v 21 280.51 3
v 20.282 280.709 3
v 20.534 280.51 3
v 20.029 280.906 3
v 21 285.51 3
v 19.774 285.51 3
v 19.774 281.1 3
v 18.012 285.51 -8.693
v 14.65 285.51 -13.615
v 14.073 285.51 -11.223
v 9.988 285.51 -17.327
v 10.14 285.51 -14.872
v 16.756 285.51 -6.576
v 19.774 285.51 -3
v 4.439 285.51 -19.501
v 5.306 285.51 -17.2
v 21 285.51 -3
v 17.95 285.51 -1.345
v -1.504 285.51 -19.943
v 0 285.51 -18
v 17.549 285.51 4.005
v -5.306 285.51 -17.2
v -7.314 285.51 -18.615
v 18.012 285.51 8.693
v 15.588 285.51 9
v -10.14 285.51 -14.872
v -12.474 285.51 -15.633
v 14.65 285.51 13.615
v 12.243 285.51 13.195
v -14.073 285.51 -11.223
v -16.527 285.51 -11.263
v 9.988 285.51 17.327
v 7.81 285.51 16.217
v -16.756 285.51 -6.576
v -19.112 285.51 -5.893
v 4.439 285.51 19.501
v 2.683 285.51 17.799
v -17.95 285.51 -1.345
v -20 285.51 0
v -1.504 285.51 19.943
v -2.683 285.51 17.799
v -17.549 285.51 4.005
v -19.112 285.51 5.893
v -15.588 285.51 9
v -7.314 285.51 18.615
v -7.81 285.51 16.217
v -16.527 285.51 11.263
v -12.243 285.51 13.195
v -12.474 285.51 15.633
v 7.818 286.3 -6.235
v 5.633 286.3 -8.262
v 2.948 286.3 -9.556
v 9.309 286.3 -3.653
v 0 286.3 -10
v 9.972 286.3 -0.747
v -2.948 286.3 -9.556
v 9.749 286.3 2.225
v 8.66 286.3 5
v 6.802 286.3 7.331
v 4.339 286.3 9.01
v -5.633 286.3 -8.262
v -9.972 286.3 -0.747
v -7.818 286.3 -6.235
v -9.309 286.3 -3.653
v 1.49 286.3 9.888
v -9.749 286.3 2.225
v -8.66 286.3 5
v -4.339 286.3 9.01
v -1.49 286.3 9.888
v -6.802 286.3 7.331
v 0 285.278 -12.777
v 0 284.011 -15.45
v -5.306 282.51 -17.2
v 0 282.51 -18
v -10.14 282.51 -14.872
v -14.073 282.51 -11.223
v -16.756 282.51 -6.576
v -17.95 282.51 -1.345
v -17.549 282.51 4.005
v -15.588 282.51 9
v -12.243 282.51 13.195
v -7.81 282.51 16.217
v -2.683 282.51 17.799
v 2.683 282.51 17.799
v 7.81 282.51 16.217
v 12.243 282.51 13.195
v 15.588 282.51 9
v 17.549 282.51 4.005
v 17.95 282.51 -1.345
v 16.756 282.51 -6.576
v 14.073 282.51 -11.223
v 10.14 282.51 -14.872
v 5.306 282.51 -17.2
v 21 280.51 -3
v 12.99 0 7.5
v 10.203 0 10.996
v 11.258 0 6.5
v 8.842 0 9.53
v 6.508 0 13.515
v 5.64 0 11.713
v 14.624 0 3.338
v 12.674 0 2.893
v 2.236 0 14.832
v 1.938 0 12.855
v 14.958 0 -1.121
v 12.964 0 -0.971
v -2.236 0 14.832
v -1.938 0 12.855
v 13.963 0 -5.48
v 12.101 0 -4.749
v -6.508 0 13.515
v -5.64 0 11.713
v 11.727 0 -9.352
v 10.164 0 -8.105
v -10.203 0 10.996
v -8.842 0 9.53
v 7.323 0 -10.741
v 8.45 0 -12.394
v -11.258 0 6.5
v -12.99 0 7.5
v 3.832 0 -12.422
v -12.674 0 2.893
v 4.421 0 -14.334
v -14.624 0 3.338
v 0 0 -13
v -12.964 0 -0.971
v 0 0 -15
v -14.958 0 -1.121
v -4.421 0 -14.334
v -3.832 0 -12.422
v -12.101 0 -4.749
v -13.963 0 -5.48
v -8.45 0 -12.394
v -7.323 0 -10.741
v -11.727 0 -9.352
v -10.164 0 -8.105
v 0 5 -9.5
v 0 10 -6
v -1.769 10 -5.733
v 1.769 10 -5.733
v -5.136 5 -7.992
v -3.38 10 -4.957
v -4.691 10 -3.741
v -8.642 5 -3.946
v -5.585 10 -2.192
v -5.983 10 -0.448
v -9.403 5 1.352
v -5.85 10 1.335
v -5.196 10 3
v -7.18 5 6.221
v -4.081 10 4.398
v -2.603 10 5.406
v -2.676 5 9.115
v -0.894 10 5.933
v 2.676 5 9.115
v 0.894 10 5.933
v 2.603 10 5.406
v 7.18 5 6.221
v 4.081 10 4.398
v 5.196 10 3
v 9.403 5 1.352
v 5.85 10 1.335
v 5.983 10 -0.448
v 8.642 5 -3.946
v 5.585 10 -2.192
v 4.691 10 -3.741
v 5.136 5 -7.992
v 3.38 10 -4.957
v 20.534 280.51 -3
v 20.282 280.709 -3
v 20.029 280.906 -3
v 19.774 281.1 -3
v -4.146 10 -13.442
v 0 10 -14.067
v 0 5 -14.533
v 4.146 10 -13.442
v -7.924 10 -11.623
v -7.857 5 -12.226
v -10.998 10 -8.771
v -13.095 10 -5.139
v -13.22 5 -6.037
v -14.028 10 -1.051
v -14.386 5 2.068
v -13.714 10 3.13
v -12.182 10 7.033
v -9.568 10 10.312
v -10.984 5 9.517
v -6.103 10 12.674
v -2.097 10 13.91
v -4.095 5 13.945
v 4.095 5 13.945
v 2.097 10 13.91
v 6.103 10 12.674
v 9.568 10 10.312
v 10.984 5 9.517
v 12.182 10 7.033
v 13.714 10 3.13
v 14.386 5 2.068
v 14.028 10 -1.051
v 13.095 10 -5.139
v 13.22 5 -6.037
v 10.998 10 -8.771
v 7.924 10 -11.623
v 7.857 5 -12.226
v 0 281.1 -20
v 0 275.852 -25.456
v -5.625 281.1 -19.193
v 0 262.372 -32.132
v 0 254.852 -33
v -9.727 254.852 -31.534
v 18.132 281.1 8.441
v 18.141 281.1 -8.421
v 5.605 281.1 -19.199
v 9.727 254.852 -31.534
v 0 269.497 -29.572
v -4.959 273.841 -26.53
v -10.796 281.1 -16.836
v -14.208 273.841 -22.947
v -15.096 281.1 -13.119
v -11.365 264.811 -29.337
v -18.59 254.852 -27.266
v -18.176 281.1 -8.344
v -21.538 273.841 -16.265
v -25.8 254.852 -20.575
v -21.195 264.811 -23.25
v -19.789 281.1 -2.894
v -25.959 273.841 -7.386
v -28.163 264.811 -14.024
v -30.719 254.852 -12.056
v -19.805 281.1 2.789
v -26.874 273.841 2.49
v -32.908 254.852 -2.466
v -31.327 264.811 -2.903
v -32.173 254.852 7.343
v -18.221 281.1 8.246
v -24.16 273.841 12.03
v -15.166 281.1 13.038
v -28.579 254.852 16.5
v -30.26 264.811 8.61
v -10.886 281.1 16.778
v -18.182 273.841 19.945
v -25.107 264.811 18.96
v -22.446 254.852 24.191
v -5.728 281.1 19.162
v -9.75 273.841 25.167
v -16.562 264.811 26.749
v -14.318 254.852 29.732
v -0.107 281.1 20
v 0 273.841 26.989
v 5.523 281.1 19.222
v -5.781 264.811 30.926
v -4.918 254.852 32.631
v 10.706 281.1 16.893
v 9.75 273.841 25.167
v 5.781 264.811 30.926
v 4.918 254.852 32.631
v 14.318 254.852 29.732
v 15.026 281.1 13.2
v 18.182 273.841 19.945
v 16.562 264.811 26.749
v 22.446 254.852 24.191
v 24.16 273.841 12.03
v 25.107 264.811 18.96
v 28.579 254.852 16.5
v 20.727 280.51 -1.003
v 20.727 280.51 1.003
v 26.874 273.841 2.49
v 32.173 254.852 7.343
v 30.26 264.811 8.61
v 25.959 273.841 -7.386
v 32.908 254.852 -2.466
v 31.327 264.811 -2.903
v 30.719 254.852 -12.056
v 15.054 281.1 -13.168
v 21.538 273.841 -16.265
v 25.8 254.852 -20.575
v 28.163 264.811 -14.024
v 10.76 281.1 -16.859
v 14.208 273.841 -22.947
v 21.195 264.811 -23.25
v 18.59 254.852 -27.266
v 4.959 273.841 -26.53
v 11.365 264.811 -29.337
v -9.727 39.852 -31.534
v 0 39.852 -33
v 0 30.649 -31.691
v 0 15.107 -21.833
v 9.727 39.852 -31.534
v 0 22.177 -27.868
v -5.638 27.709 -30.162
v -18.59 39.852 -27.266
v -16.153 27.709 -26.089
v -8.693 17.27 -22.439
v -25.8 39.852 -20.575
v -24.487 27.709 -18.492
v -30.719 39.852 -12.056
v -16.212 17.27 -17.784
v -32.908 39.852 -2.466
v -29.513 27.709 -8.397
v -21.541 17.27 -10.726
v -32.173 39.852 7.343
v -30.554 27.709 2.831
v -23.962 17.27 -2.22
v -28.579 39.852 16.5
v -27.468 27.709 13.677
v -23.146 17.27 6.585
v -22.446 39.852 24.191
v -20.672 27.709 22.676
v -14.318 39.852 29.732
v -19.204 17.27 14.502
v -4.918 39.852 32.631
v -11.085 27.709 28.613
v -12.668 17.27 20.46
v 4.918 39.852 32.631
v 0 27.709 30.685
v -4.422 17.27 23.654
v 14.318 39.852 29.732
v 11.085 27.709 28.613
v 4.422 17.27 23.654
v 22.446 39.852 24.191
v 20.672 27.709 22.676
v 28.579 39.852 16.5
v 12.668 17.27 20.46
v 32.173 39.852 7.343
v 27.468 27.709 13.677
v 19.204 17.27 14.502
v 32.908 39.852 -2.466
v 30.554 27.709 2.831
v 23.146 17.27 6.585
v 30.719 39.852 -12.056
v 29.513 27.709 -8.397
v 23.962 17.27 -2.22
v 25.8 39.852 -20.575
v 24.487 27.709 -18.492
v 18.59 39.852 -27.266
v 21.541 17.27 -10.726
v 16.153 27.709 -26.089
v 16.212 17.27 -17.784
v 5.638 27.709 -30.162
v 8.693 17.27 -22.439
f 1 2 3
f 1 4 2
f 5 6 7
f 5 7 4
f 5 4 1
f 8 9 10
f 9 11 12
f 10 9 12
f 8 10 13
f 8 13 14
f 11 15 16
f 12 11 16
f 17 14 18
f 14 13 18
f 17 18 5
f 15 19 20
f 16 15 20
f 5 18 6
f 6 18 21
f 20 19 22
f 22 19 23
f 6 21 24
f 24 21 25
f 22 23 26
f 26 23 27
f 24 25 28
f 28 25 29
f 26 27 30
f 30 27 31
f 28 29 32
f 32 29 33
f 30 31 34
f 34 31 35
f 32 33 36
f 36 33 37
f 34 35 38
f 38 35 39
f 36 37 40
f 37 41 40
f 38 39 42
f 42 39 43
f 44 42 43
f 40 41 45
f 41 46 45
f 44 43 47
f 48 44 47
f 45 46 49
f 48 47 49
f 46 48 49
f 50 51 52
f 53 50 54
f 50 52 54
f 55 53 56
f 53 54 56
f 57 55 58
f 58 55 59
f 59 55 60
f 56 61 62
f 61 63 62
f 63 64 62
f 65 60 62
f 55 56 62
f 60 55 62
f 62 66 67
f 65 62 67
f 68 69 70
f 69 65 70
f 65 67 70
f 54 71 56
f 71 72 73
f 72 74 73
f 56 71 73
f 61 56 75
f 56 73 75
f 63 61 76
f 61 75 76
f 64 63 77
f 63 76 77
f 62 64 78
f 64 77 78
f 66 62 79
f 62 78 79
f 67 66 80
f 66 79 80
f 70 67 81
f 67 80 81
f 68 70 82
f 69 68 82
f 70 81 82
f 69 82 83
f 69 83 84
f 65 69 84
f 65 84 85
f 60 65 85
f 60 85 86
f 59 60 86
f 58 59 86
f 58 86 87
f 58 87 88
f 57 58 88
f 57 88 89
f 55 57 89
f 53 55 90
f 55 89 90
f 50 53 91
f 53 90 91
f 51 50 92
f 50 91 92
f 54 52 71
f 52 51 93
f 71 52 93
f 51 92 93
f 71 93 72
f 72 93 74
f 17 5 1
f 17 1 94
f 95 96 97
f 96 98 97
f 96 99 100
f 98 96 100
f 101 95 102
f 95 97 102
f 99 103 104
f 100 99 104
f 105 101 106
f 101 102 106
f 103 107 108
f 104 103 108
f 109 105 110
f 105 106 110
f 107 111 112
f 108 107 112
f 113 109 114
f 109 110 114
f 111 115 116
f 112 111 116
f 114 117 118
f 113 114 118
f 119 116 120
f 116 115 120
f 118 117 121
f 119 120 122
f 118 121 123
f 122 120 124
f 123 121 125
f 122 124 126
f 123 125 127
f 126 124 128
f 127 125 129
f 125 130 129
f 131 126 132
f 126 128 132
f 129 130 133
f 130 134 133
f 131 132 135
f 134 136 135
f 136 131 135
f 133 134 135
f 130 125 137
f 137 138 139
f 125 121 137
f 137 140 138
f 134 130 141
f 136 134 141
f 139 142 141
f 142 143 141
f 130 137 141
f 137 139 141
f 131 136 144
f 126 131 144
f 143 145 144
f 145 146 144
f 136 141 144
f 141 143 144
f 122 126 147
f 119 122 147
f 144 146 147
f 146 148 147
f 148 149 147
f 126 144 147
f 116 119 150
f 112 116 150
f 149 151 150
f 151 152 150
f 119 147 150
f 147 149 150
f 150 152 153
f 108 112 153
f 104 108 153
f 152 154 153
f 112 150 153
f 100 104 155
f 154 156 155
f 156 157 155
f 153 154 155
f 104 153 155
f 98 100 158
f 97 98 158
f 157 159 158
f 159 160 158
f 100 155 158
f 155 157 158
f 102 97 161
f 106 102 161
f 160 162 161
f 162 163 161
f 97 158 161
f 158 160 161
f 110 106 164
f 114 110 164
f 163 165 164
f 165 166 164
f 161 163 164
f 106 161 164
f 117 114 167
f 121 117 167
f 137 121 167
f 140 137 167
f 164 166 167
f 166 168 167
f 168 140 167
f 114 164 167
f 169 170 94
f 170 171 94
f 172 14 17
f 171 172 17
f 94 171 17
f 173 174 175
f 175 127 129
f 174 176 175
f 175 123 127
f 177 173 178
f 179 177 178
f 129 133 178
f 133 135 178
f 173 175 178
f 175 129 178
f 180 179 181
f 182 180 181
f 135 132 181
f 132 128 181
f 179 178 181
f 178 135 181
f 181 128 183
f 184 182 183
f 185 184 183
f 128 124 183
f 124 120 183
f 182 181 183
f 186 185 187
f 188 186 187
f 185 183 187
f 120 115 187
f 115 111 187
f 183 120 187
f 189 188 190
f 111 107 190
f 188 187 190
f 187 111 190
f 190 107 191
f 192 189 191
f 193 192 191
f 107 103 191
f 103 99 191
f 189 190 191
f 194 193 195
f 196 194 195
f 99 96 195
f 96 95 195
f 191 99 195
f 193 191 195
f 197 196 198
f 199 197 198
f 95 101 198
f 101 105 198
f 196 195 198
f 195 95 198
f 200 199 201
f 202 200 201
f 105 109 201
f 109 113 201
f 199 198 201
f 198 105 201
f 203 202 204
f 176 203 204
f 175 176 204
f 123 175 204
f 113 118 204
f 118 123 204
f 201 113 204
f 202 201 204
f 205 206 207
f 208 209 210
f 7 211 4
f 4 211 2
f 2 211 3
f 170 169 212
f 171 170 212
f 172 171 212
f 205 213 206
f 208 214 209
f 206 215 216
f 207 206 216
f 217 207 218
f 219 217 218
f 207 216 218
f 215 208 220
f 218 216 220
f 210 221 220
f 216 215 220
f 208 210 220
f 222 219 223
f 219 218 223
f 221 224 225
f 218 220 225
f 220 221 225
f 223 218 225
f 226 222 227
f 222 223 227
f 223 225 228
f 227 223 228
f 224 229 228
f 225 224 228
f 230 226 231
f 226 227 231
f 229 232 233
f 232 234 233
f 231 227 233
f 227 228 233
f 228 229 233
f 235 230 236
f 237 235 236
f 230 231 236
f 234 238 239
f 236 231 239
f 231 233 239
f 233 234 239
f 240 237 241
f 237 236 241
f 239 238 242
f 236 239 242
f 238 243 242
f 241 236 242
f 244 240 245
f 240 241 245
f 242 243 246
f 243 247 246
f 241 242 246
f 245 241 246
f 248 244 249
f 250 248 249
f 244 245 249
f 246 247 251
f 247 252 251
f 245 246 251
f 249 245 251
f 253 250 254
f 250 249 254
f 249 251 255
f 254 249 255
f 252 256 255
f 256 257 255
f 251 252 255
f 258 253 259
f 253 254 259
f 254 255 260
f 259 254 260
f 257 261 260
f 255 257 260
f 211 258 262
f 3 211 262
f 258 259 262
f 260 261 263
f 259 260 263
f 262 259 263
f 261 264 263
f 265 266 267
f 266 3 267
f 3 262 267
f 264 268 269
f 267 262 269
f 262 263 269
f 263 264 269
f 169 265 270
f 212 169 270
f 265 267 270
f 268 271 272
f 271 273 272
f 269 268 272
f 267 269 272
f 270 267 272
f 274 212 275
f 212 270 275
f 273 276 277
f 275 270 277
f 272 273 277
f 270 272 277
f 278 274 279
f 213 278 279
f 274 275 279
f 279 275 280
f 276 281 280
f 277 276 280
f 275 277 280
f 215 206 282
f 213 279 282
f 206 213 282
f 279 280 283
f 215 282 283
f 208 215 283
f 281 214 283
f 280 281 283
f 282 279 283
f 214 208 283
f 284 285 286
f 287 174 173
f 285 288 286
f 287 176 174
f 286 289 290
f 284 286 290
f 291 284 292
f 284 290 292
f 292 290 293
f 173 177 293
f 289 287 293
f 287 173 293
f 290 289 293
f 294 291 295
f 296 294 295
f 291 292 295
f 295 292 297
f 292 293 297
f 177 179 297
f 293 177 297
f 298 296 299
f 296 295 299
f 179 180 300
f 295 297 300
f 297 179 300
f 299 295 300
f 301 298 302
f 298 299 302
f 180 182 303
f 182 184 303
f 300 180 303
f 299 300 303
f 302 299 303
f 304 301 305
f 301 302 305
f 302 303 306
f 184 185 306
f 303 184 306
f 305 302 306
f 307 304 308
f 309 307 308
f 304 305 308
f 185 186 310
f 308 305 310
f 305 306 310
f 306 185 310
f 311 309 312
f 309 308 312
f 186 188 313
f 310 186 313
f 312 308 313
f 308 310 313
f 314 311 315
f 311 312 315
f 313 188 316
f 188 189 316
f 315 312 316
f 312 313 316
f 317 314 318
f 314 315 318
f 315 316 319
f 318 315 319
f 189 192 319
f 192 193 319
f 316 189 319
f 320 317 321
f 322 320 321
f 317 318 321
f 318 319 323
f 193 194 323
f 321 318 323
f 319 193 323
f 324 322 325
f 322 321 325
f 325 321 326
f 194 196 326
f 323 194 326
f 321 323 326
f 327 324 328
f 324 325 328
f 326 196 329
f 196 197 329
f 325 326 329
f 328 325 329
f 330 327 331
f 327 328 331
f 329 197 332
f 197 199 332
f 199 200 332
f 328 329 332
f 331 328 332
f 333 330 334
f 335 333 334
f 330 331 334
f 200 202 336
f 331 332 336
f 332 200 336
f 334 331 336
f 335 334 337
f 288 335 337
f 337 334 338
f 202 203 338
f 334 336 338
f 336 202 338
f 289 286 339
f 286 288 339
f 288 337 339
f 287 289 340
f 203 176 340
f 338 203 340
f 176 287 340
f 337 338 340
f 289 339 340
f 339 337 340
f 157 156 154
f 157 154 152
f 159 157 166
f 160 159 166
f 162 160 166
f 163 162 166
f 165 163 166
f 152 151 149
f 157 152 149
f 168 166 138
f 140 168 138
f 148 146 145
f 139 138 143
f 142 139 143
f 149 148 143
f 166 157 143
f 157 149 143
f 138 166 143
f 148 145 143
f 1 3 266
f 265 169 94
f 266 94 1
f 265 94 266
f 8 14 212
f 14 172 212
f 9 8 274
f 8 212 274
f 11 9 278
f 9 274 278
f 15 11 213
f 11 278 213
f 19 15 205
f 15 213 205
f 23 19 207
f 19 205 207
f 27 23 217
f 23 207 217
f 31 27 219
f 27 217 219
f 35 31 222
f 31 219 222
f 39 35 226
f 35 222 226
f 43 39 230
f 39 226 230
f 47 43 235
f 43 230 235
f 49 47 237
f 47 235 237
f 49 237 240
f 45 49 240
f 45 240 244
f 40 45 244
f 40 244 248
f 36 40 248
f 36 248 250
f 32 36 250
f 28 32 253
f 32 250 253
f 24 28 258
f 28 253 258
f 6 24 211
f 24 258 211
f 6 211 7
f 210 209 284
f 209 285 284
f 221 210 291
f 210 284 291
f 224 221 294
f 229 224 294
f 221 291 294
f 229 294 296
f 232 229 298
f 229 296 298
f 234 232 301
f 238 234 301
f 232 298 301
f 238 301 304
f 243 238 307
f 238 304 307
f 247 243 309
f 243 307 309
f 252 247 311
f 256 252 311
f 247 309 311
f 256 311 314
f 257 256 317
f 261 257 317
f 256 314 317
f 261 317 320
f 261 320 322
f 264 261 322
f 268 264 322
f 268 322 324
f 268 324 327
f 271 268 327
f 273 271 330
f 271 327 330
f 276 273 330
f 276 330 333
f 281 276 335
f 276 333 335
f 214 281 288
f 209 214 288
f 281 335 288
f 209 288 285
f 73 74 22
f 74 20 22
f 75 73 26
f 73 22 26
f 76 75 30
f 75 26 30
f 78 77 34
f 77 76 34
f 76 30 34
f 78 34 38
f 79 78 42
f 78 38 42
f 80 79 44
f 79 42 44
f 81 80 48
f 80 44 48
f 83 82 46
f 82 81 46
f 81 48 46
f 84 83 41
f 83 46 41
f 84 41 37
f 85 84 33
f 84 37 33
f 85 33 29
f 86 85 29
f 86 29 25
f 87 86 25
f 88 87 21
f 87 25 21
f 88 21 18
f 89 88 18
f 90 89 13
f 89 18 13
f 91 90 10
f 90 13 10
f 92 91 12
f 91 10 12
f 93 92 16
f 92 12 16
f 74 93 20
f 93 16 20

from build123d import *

# Parameters (mm, degrees)
SKETCH_2_W        = 3
SKETCH_2_H        = 6
EXTRUDE_660_DEPTH = 5


with BuildPart() as part:
    # Sketch 202 → Revolve 495 (revolve)
    with BuildSketch(Plane.XY, mode=Mode.PRIVATE) as revolve_495_sk:
        with BuildLine():
            Line((15, 0), (13, 0))
            Line((13, 0), (6, 10))
            Line((6, 10), (0, 10))
            Line((0, 10), (0, 286.3))
            Line((0, 286.3), (10, 286.3))
            ThreePointArc((10, 286.3), (14.127651137, 284.674598502), (18, 282.510262985))
            Line((18, 282.510262985), (18, 285.510262985))
            Line((18, 285.510262985), (20, 285.510262985))
            Line((20, 285.510262985), (20, 281.10043911))
            ThreePointArc((20, 281.10043911), (29.571946165, 269.497448129), (33, 254.851629613))
            Line((33, 254.851629613), (33, 39.851629613))
            ThreePointArc((33, 39.851629613), (27.867639585, 22.176939688), (14.066990064, 10))
            Line((14.066990064, 10), (15, 0))
        make_face()
    revolve(revolve_495_sk.sketch.rotate(Axis((0, 0, 0), (0, 1, 0)), 90), axis=Axis((0, 0, 0), (0, 1, 0)))

    # Эскиз2 → Extrude 660 (add)
    with BuildSketch(Plane(origin=(0, 285.510262985, 0), x_dir=(1, 0, 0), z_dir=(0, 1, 0))):
        with Locations((19.5, 0)):
            Rectangle(SKETCH_2_W, SKETCH_2_H)
    extrude(amount=-EXTRUDE_660_DEPTH)


solid = part.part
